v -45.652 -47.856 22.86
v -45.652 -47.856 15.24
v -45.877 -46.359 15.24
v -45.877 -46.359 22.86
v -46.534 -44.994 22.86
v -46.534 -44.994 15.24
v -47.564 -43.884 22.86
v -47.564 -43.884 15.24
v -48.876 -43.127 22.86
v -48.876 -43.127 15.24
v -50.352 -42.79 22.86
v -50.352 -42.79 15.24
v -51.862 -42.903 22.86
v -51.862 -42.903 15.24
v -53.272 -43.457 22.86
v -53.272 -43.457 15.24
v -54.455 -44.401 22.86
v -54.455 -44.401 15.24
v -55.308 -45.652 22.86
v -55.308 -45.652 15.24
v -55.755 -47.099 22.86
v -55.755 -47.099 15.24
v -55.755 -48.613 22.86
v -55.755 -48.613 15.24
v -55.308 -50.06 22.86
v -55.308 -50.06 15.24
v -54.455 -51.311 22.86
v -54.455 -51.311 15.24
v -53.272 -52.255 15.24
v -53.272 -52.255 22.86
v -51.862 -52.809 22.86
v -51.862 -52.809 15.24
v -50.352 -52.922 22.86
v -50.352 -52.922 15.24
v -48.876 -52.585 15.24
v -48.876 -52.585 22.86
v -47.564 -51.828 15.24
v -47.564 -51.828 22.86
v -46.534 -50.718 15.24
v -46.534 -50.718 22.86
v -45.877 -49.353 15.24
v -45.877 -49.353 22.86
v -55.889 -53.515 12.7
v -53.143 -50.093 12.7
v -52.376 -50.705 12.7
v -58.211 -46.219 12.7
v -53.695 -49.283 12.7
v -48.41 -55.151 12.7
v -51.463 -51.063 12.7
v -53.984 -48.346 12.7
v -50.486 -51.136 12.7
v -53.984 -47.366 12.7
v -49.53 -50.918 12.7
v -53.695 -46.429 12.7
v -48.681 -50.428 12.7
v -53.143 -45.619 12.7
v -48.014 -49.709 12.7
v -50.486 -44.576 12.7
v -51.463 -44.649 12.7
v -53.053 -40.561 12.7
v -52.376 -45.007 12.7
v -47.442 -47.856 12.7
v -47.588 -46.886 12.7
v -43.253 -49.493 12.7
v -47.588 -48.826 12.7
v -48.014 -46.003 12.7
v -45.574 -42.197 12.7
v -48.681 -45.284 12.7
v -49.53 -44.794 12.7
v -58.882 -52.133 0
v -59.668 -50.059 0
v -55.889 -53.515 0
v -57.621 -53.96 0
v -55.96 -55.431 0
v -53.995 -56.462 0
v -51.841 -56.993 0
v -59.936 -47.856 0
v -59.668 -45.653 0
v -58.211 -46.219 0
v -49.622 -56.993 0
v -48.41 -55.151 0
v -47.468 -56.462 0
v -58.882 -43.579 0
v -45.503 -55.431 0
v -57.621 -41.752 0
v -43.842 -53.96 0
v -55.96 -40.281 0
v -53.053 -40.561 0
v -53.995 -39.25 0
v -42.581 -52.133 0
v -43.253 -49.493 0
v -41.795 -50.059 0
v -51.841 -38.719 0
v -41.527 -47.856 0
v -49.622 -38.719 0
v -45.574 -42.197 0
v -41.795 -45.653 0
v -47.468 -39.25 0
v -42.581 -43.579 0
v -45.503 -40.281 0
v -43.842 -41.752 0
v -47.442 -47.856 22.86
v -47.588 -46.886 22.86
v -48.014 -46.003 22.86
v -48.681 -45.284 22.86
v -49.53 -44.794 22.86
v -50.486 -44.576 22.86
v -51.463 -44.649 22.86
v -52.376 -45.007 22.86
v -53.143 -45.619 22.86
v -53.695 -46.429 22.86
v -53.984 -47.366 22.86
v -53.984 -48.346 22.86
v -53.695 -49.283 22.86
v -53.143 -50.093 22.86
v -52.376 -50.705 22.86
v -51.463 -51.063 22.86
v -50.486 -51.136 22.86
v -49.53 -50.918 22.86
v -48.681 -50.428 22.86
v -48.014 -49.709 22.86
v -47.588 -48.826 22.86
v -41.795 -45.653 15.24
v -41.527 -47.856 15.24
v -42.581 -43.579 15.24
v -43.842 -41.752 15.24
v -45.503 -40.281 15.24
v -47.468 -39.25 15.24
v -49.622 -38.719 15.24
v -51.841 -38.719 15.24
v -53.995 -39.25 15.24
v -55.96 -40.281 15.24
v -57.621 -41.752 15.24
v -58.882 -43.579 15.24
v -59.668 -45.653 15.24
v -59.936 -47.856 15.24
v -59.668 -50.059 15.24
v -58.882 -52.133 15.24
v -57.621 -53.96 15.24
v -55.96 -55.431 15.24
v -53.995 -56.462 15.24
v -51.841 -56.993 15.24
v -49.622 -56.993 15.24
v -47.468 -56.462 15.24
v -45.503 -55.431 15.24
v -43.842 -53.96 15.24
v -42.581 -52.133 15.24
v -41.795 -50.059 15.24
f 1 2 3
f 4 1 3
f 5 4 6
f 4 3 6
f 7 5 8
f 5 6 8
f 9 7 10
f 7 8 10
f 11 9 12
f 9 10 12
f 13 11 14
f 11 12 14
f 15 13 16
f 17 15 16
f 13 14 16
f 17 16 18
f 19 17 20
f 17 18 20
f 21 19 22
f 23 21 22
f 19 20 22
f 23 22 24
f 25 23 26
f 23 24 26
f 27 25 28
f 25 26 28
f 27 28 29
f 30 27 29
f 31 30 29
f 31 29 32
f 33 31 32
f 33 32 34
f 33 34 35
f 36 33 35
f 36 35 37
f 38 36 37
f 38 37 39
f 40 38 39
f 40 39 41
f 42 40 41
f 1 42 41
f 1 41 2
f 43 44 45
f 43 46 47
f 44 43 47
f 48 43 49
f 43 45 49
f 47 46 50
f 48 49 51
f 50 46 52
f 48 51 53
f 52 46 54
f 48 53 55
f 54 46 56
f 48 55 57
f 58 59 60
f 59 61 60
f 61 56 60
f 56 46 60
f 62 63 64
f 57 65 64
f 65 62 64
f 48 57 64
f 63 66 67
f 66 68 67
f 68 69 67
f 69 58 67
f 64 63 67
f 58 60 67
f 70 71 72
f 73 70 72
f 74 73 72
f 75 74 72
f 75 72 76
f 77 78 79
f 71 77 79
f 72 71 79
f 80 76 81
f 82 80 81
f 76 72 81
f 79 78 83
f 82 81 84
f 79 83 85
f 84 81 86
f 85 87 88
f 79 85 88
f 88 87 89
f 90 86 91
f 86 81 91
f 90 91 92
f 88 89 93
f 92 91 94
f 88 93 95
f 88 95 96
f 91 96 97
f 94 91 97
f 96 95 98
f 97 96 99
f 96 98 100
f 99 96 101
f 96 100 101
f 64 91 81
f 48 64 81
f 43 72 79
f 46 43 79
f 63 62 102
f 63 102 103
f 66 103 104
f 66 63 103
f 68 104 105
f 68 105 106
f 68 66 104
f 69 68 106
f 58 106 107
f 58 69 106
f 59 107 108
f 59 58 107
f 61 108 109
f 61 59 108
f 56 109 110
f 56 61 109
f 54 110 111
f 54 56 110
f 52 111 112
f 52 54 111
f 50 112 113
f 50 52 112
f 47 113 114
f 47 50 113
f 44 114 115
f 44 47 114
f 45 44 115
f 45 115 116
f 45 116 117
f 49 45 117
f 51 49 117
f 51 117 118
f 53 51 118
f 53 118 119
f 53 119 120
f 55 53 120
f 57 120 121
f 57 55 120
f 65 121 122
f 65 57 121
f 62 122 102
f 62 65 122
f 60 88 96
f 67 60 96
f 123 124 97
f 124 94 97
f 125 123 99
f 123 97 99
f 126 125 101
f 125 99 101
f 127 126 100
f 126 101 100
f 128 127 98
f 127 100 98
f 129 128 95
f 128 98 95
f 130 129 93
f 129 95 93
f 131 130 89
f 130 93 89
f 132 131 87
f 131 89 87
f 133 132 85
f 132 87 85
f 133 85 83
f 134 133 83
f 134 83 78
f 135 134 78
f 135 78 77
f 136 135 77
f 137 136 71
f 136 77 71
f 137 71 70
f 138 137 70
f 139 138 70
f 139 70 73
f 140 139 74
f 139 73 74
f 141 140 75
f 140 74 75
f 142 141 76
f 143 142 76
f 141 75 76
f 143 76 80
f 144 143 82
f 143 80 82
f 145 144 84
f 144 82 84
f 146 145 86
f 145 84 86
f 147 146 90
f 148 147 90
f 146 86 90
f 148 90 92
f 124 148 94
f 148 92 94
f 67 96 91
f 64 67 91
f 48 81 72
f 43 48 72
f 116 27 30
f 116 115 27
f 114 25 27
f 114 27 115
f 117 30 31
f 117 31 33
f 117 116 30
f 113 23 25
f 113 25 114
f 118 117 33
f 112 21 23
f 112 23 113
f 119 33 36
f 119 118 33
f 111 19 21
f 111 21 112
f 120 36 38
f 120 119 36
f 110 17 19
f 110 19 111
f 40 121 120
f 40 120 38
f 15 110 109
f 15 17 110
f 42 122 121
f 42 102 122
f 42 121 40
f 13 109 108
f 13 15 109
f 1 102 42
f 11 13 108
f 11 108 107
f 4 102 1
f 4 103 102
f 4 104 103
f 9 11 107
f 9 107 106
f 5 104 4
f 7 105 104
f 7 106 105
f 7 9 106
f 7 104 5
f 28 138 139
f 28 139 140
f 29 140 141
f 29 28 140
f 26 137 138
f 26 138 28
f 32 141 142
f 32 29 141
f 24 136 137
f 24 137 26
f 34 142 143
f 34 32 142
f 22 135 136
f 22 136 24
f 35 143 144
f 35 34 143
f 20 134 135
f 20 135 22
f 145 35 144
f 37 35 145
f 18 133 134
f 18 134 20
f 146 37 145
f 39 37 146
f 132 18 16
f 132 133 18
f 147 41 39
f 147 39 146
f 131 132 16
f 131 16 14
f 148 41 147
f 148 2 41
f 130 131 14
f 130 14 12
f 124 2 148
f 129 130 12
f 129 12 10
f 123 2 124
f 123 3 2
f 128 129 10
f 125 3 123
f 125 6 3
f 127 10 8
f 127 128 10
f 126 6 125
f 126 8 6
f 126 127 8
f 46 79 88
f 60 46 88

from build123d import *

# Parameters (mm, degrees)
F0_R     = 9.204375
F1_DEPTH = 12.7
F2_R     = 9.204375
F2_R_2   = 5.08
F3_DEPTH = 2.54
F2_R_3   = 3.2893
F4_DEPTH = 10.16


with BuildPart() as f1:
    # F0 (on Top) → F1 (new body)
    with BuildSketch(Plane.XY):
        with Locations((-50.731555, -47.856007)):
            Circle(F0_R)
        Polygon((-45.574418, -42.197481), (-43.252559, -49.492956), (-48.409696, -55.151481), (-55.888692, -53.514532), (-58.21055, -46.219058), (-53.053413, -40.560532), align=None, mode=Mode.SUBTRACT)
    extrude(amount=F1_DEPTH)

    # F2 (on face) → F3 (join)
    with BuildSketch(Plane.XY.offset(12.7)):
        with Locations((-50.731555, -47.856007)):
            Circle(F2_R)
        Polygon((-53.053413, -40.560532), (-45.574418, -42.197481), (-43.252559, -49.492956), (-48.409696, -55.151481), (-55.888692, -53.514532), (-58.21055, -46.219058), align=None, mode=Mode.SUBTRACT)
        Polygon((-43.252559, -49.492956), (-45.574418, -42.197481), (-53.053413, -40.560532), (-58.21055, -46.219058), (-55.888692, -53.514532), (-48.409696, -55.151481), align=None)
        with Locations((-50.731555, -47.856007)):
            Circle(F2_R_2, mode=Mode.SUBTRACT)
    extrude(amount=F3_DEPTH)

    # F2 (on face) → F4 (join)
    with BuildSketch(Plane.XY.offset(12.7)):
        with Locations((-50.731555, -47.856007)):
            Circle(F2_R_2)
        with Locations((-50.731555, -47.856007)):
            Circle(F2_R_3, mode=Mode.SUBTRACT)
    extrude(amount=F4_DEPTH)


solid = f1.part
